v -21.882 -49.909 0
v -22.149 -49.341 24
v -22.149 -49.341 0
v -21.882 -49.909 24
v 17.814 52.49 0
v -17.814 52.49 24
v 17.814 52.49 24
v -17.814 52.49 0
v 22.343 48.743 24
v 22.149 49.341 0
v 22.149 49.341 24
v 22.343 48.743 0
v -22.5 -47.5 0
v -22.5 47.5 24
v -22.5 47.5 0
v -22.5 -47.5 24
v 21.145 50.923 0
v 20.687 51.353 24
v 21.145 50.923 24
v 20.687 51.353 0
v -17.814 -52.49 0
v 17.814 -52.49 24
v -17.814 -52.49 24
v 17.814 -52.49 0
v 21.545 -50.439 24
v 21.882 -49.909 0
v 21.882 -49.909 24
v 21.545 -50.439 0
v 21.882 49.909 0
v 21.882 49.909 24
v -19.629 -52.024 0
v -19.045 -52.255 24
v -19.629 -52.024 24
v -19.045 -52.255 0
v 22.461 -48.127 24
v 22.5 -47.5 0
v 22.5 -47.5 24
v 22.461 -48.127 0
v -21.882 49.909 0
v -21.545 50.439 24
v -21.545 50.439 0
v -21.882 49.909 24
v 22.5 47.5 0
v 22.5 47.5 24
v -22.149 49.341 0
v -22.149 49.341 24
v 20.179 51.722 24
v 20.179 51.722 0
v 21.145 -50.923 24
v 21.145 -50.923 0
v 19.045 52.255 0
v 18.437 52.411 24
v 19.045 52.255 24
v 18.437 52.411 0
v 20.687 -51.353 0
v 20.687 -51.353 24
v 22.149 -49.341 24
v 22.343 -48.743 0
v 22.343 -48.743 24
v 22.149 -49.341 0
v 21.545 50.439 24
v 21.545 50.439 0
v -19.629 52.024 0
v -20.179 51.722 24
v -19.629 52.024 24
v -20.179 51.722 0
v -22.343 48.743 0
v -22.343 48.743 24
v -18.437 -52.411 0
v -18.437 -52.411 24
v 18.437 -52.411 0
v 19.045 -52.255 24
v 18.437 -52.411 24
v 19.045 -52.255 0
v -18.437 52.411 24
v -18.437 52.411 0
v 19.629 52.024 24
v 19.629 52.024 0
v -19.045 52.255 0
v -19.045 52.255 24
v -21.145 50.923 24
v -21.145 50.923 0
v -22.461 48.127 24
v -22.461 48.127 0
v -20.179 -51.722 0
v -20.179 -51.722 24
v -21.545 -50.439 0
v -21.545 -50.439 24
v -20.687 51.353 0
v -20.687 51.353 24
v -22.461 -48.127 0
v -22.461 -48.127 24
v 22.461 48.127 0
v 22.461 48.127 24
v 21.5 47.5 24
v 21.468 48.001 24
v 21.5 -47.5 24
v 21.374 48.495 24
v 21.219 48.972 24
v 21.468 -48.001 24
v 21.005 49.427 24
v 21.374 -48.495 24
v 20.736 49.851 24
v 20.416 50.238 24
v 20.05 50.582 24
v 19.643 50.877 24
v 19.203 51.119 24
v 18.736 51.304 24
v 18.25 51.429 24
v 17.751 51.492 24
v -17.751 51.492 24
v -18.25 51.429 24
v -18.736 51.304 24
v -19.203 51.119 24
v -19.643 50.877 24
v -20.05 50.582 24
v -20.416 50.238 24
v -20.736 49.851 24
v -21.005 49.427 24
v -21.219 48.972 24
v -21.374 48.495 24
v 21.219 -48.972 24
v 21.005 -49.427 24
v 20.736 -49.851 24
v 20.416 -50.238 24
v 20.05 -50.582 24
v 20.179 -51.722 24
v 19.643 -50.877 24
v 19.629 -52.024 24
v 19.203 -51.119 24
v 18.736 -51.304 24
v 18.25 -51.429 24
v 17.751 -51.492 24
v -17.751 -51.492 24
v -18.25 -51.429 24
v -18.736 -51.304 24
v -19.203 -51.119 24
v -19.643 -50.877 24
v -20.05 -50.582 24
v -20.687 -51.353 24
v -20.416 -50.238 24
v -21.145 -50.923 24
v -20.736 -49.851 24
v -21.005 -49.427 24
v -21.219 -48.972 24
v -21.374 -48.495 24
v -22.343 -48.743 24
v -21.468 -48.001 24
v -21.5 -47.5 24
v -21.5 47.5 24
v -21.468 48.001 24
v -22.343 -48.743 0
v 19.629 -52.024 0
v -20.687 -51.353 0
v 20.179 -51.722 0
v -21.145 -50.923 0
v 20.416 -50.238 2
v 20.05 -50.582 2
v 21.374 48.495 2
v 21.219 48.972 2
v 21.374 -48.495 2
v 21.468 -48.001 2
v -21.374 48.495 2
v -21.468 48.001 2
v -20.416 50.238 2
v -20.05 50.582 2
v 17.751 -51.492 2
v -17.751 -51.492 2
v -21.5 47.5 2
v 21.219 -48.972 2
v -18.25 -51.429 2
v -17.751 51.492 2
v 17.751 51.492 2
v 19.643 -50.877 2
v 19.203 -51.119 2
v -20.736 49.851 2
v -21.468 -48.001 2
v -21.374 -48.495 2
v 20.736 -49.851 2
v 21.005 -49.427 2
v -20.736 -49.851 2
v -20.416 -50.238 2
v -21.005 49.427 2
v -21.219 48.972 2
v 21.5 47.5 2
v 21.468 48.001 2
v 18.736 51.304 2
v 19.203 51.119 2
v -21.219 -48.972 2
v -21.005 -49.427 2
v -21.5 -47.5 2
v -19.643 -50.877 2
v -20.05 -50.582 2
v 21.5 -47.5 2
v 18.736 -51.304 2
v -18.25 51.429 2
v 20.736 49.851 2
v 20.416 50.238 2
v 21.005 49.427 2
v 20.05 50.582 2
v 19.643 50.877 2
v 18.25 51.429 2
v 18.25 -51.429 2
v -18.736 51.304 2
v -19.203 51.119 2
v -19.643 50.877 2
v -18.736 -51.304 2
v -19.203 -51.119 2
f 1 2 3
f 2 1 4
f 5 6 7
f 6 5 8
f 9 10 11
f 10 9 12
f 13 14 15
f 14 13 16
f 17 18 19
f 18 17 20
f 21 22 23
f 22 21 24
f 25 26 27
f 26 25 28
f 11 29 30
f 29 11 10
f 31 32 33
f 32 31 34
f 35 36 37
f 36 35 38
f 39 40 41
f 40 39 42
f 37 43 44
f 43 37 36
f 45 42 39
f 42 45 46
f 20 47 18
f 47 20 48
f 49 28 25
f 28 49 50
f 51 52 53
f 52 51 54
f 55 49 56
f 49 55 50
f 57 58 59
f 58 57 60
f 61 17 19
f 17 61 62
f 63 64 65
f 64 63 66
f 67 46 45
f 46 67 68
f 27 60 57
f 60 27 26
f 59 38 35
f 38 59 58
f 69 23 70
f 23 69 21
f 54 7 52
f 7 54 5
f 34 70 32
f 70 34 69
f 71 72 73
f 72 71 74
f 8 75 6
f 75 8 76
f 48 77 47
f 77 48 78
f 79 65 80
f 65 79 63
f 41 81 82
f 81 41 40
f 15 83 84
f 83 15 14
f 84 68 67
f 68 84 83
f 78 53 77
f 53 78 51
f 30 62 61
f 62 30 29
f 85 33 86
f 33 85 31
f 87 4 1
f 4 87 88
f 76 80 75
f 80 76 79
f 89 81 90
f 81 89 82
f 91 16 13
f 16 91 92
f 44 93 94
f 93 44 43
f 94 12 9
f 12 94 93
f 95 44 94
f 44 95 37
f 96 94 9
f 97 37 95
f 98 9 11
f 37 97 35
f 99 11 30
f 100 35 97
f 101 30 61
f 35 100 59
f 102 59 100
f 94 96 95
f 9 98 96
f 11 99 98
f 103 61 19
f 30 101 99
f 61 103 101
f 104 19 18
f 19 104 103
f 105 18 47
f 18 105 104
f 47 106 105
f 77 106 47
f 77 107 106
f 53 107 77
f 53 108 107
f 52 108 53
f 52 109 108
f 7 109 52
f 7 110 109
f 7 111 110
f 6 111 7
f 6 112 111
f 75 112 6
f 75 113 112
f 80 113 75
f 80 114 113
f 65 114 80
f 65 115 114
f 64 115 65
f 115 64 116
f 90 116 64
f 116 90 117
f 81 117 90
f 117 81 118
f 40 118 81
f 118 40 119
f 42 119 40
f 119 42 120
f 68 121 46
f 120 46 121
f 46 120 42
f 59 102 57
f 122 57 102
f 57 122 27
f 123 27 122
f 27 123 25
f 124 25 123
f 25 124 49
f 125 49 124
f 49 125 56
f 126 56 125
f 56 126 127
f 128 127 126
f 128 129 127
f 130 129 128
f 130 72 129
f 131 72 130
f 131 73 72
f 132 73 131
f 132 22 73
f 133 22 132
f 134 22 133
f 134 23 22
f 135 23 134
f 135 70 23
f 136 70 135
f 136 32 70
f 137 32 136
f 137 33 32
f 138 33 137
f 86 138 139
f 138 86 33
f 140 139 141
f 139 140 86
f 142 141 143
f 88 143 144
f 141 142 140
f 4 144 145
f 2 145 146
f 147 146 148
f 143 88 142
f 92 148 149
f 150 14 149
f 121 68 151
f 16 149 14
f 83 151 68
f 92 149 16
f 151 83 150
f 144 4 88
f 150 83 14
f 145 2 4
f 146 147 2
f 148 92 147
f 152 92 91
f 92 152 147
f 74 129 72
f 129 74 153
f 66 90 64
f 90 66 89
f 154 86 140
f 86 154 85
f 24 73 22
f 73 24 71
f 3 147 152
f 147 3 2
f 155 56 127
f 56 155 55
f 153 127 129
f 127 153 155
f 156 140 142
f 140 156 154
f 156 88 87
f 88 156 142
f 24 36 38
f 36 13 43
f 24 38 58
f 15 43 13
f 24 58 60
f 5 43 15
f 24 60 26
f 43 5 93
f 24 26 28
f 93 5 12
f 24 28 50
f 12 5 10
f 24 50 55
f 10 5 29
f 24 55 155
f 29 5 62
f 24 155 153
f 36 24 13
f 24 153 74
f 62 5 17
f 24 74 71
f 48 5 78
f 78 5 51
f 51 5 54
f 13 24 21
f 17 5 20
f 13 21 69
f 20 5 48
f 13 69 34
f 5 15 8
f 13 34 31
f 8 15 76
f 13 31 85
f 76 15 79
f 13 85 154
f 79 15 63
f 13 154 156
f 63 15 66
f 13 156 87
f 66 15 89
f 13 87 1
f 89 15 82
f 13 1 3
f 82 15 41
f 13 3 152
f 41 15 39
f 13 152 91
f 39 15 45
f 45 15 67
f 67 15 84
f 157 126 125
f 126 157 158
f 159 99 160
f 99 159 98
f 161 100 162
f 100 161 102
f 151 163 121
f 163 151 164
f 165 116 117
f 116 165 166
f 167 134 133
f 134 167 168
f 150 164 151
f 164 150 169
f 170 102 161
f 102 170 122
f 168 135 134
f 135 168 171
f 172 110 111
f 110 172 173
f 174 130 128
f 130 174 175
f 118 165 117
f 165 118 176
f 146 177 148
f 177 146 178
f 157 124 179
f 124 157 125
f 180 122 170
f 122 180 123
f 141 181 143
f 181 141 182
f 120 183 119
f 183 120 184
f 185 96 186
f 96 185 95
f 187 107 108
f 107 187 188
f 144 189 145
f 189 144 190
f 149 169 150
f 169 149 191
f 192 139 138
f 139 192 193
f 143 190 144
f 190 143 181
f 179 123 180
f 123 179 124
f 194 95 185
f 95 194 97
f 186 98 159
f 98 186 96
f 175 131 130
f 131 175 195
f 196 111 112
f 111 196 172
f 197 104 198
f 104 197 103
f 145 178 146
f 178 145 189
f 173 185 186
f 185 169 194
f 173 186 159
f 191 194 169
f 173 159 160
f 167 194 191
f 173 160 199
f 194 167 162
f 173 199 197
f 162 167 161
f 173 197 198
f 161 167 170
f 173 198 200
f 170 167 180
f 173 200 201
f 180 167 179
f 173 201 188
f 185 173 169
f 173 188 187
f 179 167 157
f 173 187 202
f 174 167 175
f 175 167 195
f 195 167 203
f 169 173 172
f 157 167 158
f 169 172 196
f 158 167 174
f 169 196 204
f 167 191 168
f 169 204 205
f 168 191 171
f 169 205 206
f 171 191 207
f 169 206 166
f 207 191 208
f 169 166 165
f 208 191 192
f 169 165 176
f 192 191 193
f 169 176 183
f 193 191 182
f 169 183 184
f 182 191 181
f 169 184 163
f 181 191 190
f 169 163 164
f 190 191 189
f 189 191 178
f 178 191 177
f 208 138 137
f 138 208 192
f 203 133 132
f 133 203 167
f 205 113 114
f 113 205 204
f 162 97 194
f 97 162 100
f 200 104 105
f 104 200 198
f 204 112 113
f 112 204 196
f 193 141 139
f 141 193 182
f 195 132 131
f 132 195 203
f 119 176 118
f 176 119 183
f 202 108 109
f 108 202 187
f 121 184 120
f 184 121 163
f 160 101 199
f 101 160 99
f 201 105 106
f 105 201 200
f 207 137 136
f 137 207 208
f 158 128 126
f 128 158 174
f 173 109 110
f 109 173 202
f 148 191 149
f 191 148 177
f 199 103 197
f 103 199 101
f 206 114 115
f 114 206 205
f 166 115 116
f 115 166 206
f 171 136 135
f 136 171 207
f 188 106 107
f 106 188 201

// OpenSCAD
$fn = 50;


difference() {
	union() {
		hull() {
			translate(v = [-17.5000000000, 47.5000000000, 0]) {
				cylinder(h = 24, r = 5);
			}
			translate(v = [17.5000000000, 47.5000000000, 0]) {
				cylinder(h = 24, r = 5);
			}
			translate(v = [-17.5000000000, -47.5000000000, 0]) {
				cylinder(h = 24, r = 5);
			}
			translate(v = [17.5000000000, -47.5000000000, 0]) {
				cylinder(h = 24, r = 5);
			}
		}
	}
	union() {
		translate(v = [0, 0, 2]) {
			hull() {
				translate(v = [-17.5000000000, 47.5000000000, 0]) {
					cylinder(h = 22, r = 4);
				}
				translate(v = [17.5000000000, 47.5000000000, 0]) {
					cylinder(h = 22, r = 4);
				}
				translate(v = [-17.5000000000, -47.5000000000, 0]) {
					cylinder(h = 22, r = 4);
				}
				translate(v = [17.5000000000, -47.5000000000, 0]) {
					cylinder(h = 22, r = 4);
				}
			}
		}
	}
}
